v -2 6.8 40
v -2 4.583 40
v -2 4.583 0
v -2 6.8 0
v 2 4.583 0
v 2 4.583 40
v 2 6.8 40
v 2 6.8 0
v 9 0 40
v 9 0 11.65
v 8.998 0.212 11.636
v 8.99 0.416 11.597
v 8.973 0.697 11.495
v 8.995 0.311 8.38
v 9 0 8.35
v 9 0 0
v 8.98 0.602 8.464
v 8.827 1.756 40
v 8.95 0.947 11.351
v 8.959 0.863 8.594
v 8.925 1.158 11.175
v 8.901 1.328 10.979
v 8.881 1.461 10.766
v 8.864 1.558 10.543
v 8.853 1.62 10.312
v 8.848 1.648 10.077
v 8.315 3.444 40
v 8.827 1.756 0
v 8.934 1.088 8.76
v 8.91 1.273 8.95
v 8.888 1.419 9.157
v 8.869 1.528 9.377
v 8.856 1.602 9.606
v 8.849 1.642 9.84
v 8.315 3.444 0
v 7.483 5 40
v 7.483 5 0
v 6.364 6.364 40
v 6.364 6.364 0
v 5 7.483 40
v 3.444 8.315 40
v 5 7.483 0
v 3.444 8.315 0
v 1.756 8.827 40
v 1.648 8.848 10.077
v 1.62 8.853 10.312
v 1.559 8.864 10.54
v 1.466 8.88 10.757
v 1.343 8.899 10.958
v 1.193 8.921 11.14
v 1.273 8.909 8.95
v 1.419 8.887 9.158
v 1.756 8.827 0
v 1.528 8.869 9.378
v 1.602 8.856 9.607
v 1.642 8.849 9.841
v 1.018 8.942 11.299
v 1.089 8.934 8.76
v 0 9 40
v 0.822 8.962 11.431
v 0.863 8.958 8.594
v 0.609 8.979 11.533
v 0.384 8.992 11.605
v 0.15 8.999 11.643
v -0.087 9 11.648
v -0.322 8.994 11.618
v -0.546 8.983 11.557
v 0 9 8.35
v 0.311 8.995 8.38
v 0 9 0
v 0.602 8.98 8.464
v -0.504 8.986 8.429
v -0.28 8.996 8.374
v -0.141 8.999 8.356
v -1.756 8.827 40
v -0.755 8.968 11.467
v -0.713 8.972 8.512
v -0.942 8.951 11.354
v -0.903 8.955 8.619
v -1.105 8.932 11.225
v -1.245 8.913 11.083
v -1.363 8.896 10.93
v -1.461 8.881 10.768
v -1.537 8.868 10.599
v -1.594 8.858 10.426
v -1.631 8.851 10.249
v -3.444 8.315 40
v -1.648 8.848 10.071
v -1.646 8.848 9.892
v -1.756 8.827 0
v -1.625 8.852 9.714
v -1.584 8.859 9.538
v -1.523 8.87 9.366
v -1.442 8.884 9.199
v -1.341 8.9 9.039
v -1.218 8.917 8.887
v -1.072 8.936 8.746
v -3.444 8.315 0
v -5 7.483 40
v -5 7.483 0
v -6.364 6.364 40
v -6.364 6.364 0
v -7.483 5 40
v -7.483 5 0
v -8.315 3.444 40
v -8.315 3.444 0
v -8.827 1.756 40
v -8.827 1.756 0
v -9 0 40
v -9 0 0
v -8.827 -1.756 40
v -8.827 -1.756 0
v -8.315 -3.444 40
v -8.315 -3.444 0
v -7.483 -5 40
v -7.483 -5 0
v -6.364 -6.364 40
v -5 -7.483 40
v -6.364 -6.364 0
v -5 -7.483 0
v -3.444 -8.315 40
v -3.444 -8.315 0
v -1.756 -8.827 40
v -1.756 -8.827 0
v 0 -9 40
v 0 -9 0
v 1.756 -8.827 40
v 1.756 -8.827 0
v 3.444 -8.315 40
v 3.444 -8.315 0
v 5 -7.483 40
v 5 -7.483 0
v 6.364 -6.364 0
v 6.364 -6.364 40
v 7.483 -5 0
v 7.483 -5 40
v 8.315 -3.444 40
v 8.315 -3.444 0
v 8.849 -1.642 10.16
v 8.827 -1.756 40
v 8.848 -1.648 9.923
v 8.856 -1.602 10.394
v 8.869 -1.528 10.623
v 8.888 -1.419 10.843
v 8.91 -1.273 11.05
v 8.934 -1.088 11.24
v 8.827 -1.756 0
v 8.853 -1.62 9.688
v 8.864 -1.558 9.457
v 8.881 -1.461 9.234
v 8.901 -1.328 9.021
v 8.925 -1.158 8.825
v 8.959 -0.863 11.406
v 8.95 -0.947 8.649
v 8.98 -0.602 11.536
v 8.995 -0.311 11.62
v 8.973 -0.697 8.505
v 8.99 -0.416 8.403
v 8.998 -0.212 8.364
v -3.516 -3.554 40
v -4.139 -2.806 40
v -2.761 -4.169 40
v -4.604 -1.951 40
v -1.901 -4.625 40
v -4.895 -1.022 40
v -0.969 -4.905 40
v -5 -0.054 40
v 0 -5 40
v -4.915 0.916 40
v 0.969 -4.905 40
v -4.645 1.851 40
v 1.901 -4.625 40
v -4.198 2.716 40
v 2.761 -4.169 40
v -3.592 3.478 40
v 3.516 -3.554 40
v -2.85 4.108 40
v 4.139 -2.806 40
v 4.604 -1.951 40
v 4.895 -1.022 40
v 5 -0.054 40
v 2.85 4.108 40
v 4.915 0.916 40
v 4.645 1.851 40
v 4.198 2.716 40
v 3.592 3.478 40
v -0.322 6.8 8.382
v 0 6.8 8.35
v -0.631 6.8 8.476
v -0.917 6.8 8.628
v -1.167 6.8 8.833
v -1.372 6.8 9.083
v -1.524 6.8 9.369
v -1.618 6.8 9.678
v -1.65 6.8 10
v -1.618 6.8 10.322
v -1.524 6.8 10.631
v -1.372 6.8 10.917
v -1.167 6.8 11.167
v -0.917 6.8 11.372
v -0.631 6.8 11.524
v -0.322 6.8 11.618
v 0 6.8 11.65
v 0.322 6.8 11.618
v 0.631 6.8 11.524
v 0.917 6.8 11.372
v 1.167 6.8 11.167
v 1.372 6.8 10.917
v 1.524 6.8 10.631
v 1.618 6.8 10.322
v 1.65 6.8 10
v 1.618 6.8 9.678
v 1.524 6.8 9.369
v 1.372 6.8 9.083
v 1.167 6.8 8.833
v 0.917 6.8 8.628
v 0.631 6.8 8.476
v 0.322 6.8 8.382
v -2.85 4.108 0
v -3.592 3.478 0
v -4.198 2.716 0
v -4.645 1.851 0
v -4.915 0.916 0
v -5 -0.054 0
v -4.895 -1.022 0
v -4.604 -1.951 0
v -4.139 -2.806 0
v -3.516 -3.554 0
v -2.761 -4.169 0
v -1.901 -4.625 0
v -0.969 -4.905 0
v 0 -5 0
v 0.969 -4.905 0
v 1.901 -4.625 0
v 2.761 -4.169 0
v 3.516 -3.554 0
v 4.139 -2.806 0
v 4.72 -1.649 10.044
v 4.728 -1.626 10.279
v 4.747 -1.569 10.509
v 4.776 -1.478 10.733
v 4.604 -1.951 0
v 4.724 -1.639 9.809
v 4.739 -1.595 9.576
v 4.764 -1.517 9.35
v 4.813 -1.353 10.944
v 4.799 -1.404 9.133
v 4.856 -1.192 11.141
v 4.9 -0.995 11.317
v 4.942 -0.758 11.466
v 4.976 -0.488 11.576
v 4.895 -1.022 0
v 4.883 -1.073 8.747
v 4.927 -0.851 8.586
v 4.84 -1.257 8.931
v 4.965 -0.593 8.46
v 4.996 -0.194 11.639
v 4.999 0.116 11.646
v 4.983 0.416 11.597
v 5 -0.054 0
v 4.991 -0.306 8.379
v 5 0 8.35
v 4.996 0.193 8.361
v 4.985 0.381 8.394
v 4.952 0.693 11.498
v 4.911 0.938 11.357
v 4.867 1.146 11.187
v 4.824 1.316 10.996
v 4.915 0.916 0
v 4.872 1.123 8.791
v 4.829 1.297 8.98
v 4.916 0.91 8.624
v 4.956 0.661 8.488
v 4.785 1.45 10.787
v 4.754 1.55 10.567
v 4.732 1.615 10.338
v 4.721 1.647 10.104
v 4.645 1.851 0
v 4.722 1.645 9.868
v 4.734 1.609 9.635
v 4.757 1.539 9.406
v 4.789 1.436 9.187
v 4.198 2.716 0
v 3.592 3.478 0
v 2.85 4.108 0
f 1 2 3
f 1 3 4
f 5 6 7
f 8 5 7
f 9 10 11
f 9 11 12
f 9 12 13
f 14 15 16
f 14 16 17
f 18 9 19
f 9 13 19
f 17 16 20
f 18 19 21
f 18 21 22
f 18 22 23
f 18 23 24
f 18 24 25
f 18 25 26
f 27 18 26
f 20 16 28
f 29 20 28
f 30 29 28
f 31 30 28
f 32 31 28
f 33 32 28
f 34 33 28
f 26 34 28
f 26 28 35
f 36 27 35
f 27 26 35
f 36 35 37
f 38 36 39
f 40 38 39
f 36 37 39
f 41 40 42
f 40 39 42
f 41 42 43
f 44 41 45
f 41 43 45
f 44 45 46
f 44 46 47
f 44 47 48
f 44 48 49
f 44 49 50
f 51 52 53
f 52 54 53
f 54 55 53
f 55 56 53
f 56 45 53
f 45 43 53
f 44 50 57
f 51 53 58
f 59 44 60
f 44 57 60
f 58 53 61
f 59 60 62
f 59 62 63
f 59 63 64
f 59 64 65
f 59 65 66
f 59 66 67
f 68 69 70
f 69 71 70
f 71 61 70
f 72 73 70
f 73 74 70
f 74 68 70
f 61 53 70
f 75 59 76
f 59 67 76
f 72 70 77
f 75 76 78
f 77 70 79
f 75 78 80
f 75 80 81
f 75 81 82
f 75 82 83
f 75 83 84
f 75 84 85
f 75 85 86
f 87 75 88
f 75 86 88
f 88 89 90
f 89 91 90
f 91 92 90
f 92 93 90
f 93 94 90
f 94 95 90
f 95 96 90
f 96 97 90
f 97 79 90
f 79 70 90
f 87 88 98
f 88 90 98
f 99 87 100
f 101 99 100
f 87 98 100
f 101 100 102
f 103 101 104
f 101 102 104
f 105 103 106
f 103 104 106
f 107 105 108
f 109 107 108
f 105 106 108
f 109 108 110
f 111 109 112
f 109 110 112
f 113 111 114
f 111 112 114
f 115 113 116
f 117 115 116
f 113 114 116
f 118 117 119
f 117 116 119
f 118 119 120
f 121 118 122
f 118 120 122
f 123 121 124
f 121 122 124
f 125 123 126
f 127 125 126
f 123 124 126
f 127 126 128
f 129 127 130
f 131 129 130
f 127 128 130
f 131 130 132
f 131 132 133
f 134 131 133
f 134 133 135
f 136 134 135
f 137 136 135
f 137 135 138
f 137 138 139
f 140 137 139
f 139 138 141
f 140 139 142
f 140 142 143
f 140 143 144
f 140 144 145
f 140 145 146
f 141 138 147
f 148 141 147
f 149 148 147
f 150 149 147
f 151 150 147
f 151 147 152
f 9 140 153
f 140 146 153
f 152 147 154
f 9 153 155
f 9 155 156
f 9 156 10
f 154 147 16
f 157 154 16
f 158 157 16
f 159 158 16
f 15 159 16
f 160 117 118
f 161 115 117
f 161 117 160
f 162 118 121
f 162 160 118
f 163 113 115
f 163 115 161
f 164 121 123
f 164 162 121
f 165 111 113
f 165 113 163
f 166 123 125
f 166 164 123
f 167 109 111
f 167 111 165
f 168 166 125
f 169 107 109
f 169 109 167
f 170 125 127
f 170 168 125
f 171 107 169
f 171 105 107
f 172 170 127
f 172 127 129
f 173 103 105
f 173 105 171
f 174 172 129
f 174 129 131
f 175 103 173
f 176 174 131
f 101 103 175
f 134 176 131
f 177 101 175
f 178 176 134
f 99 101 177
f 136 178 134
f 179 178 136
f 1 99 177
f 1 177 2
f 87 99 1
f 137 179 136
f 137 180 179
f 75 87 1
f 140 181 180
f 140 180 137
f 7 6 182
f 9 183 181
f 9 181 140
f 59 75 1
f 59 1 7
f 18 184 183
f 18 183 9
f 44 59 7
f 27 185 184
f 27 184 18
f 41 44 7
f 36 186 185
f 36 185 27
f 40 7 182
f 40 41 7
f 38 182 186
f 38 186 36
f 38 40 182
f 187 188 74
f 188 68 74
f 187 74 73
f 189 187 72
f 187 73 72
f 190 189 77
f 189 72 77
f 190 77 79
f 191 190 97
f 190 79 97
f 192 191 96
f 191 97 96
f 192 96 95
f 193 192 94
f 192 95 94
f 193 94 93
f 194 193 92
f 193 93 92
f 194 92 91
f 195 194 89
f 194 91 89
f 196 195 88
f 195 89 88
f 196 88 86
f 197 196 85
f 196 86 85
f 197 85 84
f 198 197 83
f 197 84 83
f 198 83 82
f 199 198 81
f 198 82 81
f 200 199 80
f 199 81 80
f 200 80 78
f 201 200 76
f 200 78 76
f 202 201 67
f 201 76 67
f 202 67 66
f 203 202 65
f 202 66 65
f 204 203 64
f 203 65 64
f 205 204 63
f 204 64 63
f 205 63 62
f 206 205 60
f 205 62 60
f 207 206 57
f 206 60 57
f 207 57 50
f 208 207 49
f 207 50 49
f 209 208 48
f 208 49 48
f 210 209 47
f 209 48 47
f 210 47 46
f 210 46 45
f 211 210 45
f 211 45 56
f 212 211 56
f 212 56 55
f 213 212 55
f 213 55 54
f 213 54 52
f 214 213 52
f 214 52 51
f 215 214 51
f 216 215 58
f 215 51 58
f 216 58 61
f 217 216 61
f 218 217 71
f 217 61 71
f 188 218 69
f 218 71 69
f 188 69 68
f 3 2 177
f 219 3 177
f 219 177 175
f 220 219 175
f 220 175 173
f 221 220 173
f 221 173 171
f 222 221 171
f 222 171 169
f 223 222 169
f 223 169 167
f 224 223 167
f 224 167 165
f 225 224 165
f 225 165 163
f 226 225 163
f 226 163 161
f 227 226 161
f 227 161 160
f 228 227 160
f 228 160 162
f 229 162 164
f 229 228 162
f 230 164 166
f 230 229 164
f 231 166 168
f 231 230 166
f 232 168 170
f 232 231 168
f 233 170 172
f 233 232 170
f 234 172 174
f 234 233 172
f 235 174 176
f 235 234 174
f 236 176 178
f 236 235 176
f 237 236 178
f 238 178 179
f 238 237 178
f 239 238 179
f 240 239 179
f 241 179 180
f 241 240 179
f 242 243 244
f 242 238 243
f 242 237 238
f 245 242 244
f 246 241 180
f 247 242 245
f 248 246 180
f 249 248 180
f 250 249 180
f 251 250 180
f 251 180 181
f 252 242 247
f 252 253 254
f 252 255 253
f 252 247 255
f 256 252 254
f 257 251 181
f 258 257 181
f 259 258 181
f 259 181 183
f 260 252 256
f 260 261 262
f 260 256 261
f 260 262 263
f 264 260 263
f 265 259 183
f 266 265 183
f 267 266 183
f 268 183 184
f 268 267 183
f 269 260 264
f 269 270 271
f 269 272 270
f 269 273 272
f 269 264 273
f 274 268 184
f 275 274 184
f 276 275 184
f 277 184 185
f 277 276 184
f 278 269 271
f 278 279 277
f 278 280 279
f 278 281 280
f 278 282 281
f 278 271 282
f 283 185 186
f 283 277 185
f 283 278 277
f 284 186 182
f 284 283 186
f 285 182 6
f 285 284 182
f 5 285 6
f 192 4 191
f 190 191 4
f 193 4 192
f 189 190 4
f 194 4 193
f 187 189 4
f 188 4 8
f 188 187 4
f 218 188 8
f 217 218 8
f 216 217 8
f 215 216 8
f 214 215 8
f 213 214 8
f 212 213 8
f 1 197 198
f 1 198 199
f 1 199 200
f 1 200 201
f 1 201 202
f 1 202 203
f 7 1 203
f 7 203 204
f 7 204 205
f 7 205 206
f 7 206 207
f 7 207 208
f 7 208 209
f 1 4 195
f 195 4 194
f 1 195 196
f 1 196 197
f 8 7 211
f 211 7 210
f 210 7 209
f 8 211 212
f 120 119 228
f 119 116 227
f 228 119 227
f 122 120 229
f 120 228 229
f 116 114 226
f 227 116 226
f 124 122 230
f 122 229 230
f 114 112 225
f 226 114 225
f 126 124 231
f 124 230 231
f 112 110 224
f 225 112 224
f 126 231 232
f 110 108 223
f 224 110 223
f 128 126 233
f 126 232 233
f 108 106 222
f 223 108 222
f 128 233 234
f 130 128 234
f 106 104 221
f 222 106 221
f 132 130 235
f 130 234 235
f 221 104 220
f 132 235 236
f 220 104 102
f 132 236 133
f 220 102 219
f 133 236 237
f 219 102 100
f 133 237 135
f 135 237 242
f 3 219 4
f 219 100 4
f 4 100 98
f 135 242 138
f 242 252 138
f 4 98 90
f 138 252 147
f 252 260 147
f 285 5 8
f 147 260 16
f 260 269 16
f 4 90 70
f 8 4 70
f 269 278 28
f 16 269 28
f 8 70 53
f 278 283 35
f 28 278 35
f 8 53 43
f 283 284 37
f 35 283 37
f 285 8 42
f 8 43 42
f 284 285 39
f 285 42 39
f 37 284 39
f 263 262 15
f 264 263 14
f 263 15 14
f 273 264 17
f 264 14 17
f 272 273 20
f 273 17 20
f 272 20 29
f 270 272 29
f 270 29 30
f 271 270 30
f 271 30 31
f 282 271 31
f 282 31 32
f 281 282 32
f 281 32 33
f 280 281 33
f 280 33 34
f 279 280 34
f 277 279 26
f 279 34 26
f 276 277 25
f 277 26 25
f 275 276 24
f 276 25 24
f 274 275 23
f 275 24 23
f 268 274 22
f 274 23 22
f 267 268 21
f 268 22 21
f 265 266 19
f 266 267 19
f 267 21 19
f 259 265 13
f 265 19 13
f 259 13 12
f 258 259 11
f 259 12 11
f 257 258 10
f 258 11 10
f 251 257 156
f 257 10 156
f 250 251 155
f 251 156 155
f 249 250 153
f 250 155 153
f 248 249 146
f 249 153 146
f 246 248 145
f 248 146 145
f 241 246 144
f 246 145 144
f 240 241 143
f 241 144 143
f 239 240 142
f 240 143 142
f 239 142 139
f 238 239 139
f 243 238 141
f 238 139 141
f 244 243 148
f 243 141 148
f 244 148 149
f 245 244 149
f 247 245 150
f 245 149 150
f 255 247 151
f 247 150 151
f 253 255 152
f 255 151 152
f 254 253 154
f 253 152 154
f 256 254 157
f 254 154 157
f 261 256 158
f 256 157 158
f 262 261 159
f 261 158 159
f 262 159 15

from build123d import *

# Parameters (mm, degrees)
SKETCH_1_R               = 9
SKETCH_1_R_2             = 5
EXTRUDE_1_DEPTH          = 40
SKETCH_2_W               = 4
SKETCH_2_H               = 3.302981626
CUT_EXTRUDE_2_DEPTH      = 42.976183724
SKETCH_3_W               = 1.65
SKETCH_3_H               = 9
PATTERN_CIRCULAR_1_COUNT = 2
PATTERN_CIRCULAR_1_ANGLE = 90


with BuildPart() as part:
    # 草图1 → 拉伸1 (new body)
    with BuildSketch(Plane.XY):
        Circle(SKETCH_1_R)
        Circle(SKETCH_1_R_2, mode=Mode.SUBTRACT)
    extrude(amount=EXTRUDE_1_DEPTH)

    # 草图2 → 拉伸2 (cut, through all)
    with BuildSketch(Plane.XY.offset(40)):
        with Locations((0, 5.148509187)):
            Rectangle(SKETCH_2_W, SKETCH_2_H)
    extrude(amount=-CUT_EXTRUDE_2_DEPTH, mode=Mode.SUBTRACT)

    # 草图3 → M4 螺纹孔2 (revolve, cut)
    with BuildSketch(Plane(origin=(0, 0, 10), x_dir=(0, 0, -1), z_dir=(1, 0, 0))):
        with Locations((0.825, 4.5)):
            Rectangle(SKETCH_3_W, SKETCH_3_H)
    hole_wizard_m4_2 = revolve(axis=Axis((0, -6.35, 10), (0, 1, 0)), mode=Mode.SUBTRACT)

    # 阵列(圆周)1: M4 螺纹孔2 ×2 about axis
    pattern_circular_1_axis = Axis((0, 0, 40), (0, 0, -1))
    for i in range(1, PATTERN_CIRCULAR_1_COUNT):
        add(hole_wizard_m4_2.rotate(pattern_circular_1_axis, i * PATTERN_CIRCULAR_1_ANGLE / (PATTERN_CIRCULAR_1_COUNT - 1)), mode=Mode.SUBTRACT)


solid = part.part
